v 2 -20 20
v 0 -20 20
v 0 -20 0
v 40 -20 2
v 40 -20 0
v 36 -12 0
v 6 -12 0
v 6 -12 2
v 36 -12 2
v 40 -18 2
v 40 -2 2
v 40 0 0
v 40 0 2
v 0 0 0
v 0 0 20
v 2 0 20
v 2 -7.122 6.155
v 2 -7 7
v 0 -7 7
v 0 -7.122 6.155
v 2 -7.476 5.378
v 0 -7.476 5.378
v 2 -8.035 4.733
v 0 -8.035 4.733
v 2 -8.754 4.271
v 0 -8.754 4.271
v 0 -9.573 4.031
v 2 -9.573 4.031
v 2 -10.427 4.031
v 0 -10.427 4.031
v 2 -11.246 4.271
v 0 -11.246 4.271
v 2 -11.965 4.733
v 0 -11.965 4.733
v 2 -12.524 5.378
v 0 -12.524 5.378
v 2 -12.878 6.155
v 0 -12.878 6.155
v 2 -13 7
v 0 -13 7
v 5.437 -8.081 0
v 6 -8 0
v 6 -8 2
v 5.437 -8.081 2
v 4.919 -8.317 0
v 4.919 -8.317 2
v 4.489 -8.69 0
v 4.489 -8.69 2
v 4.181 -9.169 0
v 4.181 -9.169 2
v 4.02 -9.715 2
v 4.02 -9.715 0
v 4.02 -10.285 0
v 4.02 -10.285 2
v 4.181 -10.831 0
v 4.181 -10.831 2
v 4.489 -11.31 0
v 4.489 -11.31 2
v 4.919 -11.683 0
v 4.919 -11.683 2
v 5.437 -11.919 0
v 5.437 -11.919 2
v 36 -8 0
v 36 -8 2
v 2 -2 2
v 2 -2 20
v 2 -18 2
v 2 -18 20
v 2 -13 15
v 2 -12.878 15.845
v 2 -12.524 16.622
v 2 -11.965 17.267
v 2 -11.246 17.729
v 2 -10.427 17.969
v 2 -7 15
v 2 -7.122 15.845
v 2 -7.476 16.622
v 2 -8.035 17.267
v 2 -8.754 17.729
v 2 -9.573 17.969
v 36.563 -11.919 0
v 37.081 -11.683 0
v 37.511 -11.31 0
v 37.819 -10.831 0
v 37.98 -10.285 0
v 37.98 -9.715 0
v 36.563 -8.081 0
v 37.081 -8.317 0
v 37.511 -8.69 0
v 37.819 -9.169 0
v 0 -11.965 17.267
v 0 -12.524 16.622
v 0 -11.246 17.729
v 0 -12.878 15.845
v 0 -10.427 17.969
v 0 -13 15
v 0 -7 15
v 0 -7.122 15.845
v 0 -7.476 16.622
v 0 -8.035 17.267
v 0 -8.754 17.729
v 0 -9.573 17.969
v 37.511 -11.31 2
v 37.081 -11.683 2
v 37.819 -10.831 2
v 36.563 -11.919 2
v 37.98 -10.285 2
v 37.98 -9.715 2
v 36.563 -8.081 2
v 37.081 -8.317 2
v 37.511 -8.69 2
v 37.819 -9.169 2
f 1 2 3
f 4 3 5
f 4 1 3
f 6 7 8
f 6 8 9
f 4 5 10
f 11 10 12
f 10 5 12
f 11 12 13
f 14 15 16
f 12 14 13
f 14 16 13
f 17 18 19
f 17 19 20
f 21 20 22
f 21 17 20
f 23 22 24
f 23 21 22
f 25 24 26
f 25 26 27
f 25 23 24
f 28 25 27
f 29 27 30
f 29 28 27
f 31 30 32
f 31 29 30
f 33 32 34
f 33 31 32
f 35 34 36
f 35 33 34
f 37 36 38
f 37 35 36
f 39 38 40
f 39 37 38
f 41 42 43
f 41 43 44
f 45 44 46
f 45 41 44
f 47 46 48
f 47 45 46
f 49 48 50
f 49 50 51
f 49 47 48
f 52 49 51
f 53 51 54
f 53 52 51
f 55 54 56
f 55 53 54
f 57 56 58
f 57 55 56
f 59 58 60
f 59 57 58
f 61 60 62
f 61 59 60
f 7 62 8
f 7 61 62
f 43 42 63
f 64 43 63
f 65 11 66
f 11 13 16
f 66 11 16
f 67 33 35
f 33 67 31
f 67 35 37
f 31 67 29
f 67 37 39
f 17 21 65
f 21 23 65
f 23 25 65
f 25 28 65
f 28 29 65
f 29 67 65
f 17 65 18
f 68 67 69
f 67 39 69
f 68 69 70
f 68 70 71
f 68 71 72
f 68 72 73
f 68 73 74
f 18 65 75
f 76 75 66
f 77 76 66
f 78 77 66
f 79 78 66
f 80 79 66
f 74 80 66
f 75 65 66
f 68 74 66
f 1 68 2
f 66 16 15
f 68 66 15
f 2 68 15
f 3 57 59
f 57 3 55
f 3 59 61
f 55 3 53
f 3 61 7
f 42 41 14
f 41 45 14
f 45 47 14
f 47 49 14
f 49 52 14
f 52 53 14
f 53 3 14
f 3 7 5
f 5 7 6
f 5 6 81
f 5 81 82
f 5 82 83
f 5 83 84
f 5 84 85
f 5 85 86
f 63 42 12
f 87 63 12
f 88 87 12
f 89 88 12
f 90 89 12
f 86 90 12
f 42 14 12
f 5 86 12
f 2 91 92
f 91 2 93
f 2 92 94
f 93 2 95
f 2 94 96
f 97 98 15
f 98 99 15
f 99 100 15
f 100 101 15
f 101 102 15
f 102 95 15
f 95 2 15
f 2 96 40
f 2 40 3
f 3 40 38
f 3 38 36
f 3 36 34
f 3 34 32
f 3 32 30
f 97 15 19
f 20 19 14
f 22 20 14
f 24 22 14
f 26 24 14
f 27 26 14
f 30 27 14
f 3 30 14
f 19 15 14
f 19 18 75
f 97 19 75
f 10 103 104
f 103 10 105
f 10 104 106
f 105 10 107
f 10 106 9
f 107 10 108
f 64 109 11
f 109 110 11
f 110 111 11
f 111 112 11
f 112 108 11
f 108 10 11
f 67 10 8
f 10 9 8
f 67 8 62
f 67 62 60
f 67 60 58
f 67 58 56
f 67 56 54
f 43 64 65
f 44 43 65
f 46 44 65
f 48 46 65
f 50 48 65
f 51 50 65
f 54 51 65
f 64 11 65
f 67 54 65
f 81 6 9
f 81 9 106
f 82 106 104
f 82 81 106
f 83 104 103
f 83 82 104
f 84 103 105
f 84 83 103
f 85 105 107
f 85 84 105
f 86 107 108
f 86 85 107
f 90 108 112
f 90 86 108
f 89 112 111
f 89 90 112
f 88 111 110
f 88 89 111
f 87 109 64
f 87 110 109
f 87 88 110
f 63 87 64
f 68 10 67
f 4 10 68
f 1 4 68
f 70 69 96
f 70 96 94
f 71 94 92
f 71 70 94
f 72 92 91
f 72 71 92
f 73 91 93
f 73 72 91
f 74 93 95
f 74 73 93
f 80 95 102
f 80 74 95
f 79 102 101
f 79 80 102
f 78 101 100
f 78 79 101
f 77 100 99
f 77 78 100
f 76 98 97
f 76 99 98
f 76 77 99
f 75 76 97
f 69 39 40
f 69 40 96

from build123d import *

# Parameters (mm, degrees)
CYLINDER002_R             = 3
CYLINDER002_DEPTH         = 2
BOX001_W                  = 8
BOX001_H                  = 6
BOX001_DEPTH              = 2
CYLINDER003_R             = 3
CYLINDER003_DEPTH         = 2
FUSION001_PLACEMENT_ANGLE = 270
CYLINDER_R                = 2
CYLINDER_DEPTH            = 2
BOX_W                     = 30
BOX_H                     = 4
BOX_DEPTH                 = 2
CYLINDER001_R             = 2
CYLINDER001_DEPTH         = 2
PAD001_DEPTH              = 16
PAD_DEPTH                 = 20


with BuildPart() as cylinder002:
    # Cylinder002 → Cylinder002 (new body)
    with BuildSketch(Plane.XY):
        Circle(CYLINDER002_R)
    extrude(amount=CYLINDER002_DEPTH)


with BuildPart() as cube001:
    # Box001 → Box001 (new body)
    with BuildSketch(Plane(origin=(0, -3, 0), x_dir=(1, 0, 0), z_dir=(0, 0, 1))):
        with Locations((4, 3)):
            Rectangle(BOX001_W, BOX001_H)
    extrude(amount=BOX001_DEPTH)


with BuildPart() as longhole002:
    # Cylinder003 → Cylinder003 (new body)
    with BuildSketch(Plane(origin=(8, 0, 0), x_dir=(1, 0, 0), z_dir=(0, 0, 1))):
        Circle(CYLINDER003_R)
    extrude(amount=CYLINDER003_DEPTH)

    # Fusion001: union Cylinder002, Cube001
    add(cylinder002.part)
    add(cube001.part)


with BuildPart() as longhole002_1:
    # Fusion001 placement: moved
    add(longhole002.part.moved(Location((2, -10, 7))).rotate(Axis((2, -10, 7), (0, 1, 0)), FUSION001_PLACEMENT_ANGLE))


with BuildPart() as cylinder:
    # Cylinder → Cylinder (new body)
    with BuildSketch(Plane.XY):
        Circle(CYLINDER_R)
    extrude(amount=CYLINDER_DEPTH)


with BuildPart() as cube:
    # Box → Box (new body)
    with BuildSketch(Plane(origin=(0, -2, 0), x_dir=(1, 0, 0), z_dir=(0, 0, 1))):
        with Locations((15, 2)):
            Rectangle(BOX_W, BOX_H)
    extrude(amount=BOX_DEPTH)


with BuildPart() as longhole1:
    # Cylinder001 → Cylinder001 (new body)
    with BuildSketch(Plane(origin=(30, 0, 0), x_dir=(1, 0, 0), z_dir=(0, 0, 1))):
        Circle(CYLINDER001_R)
    extrude(amount=CYLINDER001_DEPTH)

    # Fusion: union Cylinder, Cube
    add(cylinder.part)
    add(cube.part)


with BuildPart() as longhole1_1:
    # Fusion placement: moved
    add(longhole1.part.moved(Location((6, -10, 0))))


with BuildPart() as body001:
    # Sketch001 → Pad001 (new body)
    with BuildSketch(Plane.XZ):
        Polygon((2, 20), (40, 2), (2, 2), align=None)
    extrude(amount=PAD001_DEPTH)


with BuildPart() as body001_1:
    # Body001 placement: moved
    add(body001.part.moved(Location((0, -2, 0))))


with BuildPart() as modularmountingbracket:
    # Sketch → Pad (new body)
    with BuildSketch(Plane.XZ):
        Polygon((0, 20), (0, 0), (40, 0), (40, 2), (2, 20), align=None)
    extrude(amount=PAD_DEPTH)

    # Cut: cut Body001
    add(body001_1.part, mode=Mode.SUBTRACT)

    # Cut001: cut LongHole1
    add(longhole1_1.part, mode=Mode.SUBTRACT)

    # Cut002: cut LongHole002
    add(longhole002_1.part, mode=Mode.SUBTRACT)


solid = modularmountingbracket.part
